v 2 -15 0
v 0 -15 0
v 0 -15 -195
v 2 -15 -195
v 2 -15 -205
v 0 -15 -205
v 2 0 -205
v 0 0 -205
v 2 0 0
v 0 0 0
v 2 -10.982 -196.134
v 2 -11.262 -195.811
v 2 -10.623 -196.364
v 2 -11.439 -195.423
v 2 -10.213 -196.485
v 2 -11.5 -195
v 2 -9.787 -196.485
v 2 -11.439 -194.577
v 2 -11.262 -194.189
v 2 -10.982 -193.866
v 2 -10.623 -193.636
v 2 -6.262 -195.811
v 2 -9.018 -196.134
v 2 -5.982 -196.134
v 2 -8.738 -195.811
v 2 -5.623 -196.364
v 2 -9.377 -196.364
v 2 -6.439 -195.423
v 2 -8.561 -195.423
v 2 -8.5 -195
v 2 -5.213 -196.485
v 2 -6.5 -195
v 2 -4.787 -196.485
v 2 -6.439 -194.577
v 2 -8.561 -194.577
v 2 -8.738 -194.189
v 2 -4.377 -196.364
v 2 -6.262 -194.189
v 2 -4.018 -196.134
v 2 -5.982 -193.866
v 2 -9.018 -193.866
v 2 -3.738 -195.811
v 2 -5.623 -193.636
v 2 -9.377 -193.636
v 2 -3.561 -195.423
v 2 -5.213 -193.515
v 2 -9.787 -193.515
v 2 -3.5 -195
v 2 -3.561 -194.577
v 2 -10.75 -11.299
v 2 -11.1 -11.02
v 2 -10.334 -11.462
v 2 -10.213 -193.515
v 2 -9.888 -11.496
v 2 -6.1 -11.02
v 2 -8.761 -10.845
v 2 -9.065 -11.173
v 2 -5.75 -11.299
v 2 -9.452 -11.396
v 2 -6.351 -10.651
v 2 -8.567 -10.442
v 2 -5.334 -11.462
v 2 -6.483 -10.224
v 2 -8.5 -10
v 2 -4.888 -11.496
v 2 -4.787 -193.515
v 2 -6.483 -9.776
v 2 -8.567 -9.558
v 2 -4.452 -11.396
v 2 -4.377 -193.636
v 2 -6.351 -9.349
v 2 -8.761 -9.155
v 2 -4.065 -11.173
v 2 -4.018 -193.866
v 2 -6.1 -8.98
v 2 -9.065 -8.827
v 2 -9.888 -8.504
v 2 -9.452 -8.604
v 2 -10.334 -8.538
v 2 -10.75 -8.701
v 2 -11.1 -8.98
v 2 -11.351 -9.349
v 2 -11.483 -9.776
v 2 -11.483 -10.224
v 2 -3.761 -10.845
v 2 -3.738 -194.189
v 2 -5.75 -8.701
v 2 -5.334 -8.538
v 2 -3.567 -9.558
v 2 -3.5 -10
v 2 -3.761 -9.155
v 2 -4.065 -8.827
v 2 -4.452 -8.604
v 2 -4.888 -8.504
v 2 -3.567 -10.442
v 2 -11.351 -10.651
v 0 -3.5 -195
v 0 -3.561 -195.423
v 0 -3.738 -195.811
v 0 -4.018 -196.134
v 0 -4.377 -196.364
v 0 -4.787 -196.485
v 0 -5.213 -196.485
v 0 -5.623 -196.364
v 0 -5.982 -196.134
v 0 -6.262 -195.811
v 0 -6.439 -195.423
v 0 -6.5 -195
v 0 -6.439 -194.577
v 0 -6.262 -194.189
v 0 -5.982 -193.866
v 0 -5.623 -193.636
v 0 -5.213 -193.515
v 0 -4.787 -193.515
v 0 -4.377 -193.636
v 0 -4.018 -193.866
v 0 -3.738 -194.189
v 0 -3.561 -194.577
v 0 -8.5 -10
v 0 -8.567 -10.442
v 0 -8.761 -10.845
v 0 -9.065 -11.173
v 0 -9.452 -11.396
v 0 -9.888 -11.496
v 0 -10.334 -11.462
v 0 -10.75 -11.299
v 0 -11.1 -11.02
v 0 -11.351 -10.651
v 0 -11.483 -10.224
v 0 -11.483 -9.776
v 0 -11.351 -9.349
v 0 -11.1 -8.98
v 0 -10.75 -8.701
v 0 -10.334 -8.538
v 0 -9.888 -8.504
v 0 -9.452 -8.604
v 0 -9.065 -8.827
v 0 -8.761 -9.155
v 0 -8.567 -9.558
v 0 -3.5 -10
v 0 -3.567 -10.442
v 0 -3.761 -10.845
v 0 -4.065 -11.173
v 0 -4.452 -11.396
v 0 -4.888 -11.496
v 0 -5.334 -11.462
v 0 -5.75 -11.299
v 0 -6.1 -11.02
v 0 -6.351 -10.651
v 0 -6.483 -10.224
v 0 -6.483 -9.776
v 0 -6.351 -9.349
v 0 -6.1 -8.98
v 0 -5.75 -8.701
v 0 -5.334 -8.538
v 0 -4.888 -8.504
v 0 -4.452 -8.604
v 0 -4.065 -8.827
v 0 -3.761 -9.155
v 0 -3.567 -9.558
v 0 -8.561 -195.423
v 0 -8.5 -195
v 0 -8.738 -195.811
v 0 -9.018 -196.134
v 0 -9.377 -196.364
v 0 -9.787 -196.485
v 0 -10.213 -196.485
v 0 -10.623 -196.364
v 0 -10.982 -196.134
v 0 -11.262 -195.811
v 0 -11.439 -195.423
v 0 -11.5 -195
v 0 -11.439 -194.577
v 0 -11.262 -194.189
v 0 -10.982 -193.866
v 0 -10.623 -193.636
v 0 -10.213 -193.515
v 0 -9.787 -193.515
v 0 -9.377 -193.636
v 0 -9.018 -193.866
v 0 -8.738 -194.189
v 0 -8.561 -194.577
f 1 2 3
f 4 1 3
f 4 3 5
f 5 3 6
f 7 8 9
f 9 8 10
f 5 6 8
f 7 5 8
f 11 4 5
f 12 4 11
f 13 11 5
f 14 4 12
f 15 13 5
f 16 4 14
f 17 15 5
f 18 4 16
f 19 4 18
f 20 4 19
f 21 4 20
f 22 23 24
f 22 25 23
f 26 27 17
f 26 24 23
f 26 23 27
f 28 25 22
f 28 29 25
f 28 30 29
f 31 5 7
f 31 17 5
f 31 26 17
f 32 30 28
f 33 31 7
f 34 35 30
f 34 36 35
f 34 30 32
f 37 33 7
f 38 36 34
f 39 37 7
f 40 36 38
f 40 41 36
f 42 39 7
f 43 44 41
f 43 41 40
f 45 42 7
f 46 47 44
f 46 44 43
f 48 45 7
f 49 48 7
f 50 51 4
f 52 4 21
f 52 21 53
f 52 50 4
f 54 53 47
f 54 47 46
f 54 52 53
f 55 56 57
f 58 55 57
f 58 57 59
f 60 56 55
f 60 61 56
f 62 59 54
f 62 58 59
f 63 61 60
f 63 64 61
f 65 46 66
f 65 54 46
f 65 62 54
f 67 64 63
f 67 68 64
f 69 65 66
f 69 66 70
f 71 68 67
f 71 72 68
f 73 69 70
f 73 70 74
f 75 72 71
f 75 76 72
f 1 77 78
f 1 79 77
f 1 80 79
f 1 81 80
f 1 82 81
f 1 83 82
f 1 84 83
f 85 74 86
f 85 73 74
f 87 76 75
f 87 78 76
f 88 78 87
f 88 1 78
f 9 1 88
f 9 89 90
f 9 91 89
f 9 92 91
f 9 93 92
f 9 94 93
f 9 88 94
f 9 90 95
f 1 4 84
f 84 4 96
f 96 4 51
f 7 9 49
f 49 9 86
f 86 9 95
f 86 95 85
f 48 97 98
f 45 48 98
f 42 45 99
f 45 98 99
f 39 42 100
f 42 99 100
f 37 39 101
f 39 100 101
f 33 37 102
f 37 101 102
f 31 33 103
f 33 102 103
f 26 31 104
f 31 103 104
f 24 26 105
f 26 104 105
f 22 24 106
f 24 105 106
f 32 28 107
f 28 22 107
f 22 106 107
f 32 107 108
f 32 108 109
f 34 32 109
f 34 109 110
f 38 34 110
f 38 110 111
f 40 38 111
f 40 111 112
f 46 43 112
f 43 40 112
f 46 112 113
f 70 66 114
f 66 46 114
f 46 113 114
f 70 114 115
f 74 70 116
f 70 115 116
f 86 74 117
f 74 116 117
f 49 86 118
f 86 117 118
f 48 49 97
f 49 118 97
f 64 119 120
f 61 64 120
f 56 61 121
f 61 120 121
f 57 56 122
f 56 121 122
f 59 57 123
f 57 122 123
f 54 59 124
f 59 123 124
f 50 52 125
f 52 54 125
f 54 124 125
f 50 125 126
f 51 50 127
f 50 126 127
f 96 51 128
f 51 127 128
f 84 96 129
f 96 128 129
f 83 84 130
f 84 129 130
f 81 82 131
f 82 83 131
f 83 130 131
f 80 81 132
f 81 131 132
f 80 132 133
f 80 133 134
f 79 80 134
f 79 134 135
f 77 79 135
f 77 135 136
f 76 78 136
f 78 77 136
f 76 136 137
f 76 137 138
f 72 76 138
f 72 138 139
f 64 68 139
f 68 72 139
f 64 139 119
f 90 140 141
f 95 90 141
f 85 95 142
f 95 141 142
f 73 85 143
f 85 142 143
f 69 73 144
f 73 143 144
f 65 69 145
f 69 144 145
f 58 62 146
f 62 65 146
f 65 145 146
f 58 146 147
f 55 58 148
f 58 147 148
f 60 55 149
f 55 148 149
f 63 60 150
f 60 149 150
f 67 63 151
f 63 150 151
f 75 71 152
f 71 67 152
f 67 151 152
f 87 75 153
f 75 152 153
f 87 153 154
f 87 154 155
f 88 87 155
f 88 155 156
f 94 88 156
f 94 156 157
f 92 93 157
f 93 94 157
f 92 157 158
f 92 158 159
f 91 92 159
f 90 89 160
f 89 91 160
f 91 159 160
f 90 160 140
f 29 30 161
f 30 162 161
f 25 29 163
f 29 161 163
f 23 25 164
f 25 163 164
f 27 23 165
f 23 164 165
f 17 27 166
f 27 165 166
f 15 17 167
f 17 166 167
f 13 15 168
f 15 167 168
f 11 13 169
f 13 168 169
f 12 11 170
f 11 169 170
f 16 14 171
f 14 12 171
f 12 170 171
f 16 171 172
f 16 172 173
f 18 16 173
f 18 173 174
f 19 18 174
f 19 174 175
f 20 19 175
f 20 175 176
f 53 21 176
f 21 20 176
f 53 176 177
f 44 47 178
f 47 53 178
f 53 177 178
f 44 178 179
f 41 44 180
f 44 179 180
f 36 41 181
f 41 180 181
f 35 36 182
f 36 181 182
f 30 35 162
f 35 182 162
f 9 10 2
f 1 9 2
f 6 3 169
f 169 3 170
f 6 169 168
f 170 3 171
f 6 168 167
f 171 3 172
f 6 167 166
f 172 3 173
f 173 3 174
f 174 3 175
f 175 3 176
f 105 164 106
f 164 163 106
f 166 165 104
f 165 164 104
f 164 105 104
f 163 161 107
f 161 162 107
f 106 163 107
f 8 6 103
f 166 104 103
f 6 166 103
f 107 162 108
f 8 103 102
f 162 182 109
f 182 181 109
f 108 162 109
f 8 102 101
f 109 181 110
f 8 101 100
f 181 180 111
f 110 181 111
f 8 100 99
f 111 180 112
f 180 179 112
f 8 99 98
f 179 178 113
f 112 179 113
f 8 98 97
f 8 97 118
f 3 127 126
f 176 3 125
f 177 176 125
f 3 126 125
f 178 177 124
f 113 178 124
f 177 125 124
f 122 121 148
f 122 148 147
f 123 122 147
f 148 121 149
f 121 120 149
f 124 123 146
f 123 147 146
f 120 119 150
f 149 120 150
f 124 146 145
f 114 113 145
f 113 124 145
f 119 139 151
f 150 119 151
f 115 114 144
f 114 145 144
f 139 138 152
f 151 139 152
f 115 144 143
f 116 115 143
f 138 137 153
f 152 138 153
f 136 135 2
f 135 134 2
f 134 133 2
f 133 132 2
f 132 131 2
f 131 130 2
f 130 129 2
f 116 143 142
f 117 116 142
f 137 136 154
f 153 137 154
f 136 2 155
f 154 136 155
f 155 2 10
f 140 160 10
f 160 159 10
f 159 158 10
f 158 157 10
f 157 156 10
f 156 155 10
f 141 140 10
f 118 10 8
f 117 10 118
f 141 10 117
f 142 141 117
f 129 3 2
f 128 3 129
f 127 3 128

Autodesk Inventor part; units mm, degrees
ref_plane "YZ Plane" through (0, 0, 0) normal (1, 0, 0) x (0, 1, 0)
ref_plane "XZ Plane" through (0, 0, 0) normal (0, 1, 0) x (-1, 0, 0)
ref_plane "XY Plane" through (0, 0, 0) normal (0, 0, 1) x (1, 0, 0)
sketch "Sketch1" plane through (0, 0, 0) normal (1, 0, 0) x (0, 1, 0)
  line L0 (0, 0) -> (-15, 0)
  line L1 (-15, 0) -> (-15, -205)
  line L2 (-15, -205) -> (0, -205)
  line L3 (0, -205) -> (0, 0)
  line L4 (-15, -205) -> (-15, -195)
  line L5 (-15, -195) -> (-10, -195)
  circle A0 centre (-10, -195) radius 1.5
  line L6 (-10, -195) -> (-5, -195)
  circle A1 centre (-5, -195) radius 1.5
  line L7 (0, -102.5) -> (-15, -102.5)
  circle A2 centre (-10, -10) radius 1.5
  circle A3 centre (-5, -10) radius 1.5
  dimension "d0" = 15
  dimension "d1" = 205
  dimension "d2" = 10
  dimension "d3" = 5
  dimension "d4" = 3
  dimension "d5" = 5
  dimension "d6" = 3
extrude "Extrusion1" add sketch "Sketch1" along normal blind 2
properties part number "plateHolder2"
